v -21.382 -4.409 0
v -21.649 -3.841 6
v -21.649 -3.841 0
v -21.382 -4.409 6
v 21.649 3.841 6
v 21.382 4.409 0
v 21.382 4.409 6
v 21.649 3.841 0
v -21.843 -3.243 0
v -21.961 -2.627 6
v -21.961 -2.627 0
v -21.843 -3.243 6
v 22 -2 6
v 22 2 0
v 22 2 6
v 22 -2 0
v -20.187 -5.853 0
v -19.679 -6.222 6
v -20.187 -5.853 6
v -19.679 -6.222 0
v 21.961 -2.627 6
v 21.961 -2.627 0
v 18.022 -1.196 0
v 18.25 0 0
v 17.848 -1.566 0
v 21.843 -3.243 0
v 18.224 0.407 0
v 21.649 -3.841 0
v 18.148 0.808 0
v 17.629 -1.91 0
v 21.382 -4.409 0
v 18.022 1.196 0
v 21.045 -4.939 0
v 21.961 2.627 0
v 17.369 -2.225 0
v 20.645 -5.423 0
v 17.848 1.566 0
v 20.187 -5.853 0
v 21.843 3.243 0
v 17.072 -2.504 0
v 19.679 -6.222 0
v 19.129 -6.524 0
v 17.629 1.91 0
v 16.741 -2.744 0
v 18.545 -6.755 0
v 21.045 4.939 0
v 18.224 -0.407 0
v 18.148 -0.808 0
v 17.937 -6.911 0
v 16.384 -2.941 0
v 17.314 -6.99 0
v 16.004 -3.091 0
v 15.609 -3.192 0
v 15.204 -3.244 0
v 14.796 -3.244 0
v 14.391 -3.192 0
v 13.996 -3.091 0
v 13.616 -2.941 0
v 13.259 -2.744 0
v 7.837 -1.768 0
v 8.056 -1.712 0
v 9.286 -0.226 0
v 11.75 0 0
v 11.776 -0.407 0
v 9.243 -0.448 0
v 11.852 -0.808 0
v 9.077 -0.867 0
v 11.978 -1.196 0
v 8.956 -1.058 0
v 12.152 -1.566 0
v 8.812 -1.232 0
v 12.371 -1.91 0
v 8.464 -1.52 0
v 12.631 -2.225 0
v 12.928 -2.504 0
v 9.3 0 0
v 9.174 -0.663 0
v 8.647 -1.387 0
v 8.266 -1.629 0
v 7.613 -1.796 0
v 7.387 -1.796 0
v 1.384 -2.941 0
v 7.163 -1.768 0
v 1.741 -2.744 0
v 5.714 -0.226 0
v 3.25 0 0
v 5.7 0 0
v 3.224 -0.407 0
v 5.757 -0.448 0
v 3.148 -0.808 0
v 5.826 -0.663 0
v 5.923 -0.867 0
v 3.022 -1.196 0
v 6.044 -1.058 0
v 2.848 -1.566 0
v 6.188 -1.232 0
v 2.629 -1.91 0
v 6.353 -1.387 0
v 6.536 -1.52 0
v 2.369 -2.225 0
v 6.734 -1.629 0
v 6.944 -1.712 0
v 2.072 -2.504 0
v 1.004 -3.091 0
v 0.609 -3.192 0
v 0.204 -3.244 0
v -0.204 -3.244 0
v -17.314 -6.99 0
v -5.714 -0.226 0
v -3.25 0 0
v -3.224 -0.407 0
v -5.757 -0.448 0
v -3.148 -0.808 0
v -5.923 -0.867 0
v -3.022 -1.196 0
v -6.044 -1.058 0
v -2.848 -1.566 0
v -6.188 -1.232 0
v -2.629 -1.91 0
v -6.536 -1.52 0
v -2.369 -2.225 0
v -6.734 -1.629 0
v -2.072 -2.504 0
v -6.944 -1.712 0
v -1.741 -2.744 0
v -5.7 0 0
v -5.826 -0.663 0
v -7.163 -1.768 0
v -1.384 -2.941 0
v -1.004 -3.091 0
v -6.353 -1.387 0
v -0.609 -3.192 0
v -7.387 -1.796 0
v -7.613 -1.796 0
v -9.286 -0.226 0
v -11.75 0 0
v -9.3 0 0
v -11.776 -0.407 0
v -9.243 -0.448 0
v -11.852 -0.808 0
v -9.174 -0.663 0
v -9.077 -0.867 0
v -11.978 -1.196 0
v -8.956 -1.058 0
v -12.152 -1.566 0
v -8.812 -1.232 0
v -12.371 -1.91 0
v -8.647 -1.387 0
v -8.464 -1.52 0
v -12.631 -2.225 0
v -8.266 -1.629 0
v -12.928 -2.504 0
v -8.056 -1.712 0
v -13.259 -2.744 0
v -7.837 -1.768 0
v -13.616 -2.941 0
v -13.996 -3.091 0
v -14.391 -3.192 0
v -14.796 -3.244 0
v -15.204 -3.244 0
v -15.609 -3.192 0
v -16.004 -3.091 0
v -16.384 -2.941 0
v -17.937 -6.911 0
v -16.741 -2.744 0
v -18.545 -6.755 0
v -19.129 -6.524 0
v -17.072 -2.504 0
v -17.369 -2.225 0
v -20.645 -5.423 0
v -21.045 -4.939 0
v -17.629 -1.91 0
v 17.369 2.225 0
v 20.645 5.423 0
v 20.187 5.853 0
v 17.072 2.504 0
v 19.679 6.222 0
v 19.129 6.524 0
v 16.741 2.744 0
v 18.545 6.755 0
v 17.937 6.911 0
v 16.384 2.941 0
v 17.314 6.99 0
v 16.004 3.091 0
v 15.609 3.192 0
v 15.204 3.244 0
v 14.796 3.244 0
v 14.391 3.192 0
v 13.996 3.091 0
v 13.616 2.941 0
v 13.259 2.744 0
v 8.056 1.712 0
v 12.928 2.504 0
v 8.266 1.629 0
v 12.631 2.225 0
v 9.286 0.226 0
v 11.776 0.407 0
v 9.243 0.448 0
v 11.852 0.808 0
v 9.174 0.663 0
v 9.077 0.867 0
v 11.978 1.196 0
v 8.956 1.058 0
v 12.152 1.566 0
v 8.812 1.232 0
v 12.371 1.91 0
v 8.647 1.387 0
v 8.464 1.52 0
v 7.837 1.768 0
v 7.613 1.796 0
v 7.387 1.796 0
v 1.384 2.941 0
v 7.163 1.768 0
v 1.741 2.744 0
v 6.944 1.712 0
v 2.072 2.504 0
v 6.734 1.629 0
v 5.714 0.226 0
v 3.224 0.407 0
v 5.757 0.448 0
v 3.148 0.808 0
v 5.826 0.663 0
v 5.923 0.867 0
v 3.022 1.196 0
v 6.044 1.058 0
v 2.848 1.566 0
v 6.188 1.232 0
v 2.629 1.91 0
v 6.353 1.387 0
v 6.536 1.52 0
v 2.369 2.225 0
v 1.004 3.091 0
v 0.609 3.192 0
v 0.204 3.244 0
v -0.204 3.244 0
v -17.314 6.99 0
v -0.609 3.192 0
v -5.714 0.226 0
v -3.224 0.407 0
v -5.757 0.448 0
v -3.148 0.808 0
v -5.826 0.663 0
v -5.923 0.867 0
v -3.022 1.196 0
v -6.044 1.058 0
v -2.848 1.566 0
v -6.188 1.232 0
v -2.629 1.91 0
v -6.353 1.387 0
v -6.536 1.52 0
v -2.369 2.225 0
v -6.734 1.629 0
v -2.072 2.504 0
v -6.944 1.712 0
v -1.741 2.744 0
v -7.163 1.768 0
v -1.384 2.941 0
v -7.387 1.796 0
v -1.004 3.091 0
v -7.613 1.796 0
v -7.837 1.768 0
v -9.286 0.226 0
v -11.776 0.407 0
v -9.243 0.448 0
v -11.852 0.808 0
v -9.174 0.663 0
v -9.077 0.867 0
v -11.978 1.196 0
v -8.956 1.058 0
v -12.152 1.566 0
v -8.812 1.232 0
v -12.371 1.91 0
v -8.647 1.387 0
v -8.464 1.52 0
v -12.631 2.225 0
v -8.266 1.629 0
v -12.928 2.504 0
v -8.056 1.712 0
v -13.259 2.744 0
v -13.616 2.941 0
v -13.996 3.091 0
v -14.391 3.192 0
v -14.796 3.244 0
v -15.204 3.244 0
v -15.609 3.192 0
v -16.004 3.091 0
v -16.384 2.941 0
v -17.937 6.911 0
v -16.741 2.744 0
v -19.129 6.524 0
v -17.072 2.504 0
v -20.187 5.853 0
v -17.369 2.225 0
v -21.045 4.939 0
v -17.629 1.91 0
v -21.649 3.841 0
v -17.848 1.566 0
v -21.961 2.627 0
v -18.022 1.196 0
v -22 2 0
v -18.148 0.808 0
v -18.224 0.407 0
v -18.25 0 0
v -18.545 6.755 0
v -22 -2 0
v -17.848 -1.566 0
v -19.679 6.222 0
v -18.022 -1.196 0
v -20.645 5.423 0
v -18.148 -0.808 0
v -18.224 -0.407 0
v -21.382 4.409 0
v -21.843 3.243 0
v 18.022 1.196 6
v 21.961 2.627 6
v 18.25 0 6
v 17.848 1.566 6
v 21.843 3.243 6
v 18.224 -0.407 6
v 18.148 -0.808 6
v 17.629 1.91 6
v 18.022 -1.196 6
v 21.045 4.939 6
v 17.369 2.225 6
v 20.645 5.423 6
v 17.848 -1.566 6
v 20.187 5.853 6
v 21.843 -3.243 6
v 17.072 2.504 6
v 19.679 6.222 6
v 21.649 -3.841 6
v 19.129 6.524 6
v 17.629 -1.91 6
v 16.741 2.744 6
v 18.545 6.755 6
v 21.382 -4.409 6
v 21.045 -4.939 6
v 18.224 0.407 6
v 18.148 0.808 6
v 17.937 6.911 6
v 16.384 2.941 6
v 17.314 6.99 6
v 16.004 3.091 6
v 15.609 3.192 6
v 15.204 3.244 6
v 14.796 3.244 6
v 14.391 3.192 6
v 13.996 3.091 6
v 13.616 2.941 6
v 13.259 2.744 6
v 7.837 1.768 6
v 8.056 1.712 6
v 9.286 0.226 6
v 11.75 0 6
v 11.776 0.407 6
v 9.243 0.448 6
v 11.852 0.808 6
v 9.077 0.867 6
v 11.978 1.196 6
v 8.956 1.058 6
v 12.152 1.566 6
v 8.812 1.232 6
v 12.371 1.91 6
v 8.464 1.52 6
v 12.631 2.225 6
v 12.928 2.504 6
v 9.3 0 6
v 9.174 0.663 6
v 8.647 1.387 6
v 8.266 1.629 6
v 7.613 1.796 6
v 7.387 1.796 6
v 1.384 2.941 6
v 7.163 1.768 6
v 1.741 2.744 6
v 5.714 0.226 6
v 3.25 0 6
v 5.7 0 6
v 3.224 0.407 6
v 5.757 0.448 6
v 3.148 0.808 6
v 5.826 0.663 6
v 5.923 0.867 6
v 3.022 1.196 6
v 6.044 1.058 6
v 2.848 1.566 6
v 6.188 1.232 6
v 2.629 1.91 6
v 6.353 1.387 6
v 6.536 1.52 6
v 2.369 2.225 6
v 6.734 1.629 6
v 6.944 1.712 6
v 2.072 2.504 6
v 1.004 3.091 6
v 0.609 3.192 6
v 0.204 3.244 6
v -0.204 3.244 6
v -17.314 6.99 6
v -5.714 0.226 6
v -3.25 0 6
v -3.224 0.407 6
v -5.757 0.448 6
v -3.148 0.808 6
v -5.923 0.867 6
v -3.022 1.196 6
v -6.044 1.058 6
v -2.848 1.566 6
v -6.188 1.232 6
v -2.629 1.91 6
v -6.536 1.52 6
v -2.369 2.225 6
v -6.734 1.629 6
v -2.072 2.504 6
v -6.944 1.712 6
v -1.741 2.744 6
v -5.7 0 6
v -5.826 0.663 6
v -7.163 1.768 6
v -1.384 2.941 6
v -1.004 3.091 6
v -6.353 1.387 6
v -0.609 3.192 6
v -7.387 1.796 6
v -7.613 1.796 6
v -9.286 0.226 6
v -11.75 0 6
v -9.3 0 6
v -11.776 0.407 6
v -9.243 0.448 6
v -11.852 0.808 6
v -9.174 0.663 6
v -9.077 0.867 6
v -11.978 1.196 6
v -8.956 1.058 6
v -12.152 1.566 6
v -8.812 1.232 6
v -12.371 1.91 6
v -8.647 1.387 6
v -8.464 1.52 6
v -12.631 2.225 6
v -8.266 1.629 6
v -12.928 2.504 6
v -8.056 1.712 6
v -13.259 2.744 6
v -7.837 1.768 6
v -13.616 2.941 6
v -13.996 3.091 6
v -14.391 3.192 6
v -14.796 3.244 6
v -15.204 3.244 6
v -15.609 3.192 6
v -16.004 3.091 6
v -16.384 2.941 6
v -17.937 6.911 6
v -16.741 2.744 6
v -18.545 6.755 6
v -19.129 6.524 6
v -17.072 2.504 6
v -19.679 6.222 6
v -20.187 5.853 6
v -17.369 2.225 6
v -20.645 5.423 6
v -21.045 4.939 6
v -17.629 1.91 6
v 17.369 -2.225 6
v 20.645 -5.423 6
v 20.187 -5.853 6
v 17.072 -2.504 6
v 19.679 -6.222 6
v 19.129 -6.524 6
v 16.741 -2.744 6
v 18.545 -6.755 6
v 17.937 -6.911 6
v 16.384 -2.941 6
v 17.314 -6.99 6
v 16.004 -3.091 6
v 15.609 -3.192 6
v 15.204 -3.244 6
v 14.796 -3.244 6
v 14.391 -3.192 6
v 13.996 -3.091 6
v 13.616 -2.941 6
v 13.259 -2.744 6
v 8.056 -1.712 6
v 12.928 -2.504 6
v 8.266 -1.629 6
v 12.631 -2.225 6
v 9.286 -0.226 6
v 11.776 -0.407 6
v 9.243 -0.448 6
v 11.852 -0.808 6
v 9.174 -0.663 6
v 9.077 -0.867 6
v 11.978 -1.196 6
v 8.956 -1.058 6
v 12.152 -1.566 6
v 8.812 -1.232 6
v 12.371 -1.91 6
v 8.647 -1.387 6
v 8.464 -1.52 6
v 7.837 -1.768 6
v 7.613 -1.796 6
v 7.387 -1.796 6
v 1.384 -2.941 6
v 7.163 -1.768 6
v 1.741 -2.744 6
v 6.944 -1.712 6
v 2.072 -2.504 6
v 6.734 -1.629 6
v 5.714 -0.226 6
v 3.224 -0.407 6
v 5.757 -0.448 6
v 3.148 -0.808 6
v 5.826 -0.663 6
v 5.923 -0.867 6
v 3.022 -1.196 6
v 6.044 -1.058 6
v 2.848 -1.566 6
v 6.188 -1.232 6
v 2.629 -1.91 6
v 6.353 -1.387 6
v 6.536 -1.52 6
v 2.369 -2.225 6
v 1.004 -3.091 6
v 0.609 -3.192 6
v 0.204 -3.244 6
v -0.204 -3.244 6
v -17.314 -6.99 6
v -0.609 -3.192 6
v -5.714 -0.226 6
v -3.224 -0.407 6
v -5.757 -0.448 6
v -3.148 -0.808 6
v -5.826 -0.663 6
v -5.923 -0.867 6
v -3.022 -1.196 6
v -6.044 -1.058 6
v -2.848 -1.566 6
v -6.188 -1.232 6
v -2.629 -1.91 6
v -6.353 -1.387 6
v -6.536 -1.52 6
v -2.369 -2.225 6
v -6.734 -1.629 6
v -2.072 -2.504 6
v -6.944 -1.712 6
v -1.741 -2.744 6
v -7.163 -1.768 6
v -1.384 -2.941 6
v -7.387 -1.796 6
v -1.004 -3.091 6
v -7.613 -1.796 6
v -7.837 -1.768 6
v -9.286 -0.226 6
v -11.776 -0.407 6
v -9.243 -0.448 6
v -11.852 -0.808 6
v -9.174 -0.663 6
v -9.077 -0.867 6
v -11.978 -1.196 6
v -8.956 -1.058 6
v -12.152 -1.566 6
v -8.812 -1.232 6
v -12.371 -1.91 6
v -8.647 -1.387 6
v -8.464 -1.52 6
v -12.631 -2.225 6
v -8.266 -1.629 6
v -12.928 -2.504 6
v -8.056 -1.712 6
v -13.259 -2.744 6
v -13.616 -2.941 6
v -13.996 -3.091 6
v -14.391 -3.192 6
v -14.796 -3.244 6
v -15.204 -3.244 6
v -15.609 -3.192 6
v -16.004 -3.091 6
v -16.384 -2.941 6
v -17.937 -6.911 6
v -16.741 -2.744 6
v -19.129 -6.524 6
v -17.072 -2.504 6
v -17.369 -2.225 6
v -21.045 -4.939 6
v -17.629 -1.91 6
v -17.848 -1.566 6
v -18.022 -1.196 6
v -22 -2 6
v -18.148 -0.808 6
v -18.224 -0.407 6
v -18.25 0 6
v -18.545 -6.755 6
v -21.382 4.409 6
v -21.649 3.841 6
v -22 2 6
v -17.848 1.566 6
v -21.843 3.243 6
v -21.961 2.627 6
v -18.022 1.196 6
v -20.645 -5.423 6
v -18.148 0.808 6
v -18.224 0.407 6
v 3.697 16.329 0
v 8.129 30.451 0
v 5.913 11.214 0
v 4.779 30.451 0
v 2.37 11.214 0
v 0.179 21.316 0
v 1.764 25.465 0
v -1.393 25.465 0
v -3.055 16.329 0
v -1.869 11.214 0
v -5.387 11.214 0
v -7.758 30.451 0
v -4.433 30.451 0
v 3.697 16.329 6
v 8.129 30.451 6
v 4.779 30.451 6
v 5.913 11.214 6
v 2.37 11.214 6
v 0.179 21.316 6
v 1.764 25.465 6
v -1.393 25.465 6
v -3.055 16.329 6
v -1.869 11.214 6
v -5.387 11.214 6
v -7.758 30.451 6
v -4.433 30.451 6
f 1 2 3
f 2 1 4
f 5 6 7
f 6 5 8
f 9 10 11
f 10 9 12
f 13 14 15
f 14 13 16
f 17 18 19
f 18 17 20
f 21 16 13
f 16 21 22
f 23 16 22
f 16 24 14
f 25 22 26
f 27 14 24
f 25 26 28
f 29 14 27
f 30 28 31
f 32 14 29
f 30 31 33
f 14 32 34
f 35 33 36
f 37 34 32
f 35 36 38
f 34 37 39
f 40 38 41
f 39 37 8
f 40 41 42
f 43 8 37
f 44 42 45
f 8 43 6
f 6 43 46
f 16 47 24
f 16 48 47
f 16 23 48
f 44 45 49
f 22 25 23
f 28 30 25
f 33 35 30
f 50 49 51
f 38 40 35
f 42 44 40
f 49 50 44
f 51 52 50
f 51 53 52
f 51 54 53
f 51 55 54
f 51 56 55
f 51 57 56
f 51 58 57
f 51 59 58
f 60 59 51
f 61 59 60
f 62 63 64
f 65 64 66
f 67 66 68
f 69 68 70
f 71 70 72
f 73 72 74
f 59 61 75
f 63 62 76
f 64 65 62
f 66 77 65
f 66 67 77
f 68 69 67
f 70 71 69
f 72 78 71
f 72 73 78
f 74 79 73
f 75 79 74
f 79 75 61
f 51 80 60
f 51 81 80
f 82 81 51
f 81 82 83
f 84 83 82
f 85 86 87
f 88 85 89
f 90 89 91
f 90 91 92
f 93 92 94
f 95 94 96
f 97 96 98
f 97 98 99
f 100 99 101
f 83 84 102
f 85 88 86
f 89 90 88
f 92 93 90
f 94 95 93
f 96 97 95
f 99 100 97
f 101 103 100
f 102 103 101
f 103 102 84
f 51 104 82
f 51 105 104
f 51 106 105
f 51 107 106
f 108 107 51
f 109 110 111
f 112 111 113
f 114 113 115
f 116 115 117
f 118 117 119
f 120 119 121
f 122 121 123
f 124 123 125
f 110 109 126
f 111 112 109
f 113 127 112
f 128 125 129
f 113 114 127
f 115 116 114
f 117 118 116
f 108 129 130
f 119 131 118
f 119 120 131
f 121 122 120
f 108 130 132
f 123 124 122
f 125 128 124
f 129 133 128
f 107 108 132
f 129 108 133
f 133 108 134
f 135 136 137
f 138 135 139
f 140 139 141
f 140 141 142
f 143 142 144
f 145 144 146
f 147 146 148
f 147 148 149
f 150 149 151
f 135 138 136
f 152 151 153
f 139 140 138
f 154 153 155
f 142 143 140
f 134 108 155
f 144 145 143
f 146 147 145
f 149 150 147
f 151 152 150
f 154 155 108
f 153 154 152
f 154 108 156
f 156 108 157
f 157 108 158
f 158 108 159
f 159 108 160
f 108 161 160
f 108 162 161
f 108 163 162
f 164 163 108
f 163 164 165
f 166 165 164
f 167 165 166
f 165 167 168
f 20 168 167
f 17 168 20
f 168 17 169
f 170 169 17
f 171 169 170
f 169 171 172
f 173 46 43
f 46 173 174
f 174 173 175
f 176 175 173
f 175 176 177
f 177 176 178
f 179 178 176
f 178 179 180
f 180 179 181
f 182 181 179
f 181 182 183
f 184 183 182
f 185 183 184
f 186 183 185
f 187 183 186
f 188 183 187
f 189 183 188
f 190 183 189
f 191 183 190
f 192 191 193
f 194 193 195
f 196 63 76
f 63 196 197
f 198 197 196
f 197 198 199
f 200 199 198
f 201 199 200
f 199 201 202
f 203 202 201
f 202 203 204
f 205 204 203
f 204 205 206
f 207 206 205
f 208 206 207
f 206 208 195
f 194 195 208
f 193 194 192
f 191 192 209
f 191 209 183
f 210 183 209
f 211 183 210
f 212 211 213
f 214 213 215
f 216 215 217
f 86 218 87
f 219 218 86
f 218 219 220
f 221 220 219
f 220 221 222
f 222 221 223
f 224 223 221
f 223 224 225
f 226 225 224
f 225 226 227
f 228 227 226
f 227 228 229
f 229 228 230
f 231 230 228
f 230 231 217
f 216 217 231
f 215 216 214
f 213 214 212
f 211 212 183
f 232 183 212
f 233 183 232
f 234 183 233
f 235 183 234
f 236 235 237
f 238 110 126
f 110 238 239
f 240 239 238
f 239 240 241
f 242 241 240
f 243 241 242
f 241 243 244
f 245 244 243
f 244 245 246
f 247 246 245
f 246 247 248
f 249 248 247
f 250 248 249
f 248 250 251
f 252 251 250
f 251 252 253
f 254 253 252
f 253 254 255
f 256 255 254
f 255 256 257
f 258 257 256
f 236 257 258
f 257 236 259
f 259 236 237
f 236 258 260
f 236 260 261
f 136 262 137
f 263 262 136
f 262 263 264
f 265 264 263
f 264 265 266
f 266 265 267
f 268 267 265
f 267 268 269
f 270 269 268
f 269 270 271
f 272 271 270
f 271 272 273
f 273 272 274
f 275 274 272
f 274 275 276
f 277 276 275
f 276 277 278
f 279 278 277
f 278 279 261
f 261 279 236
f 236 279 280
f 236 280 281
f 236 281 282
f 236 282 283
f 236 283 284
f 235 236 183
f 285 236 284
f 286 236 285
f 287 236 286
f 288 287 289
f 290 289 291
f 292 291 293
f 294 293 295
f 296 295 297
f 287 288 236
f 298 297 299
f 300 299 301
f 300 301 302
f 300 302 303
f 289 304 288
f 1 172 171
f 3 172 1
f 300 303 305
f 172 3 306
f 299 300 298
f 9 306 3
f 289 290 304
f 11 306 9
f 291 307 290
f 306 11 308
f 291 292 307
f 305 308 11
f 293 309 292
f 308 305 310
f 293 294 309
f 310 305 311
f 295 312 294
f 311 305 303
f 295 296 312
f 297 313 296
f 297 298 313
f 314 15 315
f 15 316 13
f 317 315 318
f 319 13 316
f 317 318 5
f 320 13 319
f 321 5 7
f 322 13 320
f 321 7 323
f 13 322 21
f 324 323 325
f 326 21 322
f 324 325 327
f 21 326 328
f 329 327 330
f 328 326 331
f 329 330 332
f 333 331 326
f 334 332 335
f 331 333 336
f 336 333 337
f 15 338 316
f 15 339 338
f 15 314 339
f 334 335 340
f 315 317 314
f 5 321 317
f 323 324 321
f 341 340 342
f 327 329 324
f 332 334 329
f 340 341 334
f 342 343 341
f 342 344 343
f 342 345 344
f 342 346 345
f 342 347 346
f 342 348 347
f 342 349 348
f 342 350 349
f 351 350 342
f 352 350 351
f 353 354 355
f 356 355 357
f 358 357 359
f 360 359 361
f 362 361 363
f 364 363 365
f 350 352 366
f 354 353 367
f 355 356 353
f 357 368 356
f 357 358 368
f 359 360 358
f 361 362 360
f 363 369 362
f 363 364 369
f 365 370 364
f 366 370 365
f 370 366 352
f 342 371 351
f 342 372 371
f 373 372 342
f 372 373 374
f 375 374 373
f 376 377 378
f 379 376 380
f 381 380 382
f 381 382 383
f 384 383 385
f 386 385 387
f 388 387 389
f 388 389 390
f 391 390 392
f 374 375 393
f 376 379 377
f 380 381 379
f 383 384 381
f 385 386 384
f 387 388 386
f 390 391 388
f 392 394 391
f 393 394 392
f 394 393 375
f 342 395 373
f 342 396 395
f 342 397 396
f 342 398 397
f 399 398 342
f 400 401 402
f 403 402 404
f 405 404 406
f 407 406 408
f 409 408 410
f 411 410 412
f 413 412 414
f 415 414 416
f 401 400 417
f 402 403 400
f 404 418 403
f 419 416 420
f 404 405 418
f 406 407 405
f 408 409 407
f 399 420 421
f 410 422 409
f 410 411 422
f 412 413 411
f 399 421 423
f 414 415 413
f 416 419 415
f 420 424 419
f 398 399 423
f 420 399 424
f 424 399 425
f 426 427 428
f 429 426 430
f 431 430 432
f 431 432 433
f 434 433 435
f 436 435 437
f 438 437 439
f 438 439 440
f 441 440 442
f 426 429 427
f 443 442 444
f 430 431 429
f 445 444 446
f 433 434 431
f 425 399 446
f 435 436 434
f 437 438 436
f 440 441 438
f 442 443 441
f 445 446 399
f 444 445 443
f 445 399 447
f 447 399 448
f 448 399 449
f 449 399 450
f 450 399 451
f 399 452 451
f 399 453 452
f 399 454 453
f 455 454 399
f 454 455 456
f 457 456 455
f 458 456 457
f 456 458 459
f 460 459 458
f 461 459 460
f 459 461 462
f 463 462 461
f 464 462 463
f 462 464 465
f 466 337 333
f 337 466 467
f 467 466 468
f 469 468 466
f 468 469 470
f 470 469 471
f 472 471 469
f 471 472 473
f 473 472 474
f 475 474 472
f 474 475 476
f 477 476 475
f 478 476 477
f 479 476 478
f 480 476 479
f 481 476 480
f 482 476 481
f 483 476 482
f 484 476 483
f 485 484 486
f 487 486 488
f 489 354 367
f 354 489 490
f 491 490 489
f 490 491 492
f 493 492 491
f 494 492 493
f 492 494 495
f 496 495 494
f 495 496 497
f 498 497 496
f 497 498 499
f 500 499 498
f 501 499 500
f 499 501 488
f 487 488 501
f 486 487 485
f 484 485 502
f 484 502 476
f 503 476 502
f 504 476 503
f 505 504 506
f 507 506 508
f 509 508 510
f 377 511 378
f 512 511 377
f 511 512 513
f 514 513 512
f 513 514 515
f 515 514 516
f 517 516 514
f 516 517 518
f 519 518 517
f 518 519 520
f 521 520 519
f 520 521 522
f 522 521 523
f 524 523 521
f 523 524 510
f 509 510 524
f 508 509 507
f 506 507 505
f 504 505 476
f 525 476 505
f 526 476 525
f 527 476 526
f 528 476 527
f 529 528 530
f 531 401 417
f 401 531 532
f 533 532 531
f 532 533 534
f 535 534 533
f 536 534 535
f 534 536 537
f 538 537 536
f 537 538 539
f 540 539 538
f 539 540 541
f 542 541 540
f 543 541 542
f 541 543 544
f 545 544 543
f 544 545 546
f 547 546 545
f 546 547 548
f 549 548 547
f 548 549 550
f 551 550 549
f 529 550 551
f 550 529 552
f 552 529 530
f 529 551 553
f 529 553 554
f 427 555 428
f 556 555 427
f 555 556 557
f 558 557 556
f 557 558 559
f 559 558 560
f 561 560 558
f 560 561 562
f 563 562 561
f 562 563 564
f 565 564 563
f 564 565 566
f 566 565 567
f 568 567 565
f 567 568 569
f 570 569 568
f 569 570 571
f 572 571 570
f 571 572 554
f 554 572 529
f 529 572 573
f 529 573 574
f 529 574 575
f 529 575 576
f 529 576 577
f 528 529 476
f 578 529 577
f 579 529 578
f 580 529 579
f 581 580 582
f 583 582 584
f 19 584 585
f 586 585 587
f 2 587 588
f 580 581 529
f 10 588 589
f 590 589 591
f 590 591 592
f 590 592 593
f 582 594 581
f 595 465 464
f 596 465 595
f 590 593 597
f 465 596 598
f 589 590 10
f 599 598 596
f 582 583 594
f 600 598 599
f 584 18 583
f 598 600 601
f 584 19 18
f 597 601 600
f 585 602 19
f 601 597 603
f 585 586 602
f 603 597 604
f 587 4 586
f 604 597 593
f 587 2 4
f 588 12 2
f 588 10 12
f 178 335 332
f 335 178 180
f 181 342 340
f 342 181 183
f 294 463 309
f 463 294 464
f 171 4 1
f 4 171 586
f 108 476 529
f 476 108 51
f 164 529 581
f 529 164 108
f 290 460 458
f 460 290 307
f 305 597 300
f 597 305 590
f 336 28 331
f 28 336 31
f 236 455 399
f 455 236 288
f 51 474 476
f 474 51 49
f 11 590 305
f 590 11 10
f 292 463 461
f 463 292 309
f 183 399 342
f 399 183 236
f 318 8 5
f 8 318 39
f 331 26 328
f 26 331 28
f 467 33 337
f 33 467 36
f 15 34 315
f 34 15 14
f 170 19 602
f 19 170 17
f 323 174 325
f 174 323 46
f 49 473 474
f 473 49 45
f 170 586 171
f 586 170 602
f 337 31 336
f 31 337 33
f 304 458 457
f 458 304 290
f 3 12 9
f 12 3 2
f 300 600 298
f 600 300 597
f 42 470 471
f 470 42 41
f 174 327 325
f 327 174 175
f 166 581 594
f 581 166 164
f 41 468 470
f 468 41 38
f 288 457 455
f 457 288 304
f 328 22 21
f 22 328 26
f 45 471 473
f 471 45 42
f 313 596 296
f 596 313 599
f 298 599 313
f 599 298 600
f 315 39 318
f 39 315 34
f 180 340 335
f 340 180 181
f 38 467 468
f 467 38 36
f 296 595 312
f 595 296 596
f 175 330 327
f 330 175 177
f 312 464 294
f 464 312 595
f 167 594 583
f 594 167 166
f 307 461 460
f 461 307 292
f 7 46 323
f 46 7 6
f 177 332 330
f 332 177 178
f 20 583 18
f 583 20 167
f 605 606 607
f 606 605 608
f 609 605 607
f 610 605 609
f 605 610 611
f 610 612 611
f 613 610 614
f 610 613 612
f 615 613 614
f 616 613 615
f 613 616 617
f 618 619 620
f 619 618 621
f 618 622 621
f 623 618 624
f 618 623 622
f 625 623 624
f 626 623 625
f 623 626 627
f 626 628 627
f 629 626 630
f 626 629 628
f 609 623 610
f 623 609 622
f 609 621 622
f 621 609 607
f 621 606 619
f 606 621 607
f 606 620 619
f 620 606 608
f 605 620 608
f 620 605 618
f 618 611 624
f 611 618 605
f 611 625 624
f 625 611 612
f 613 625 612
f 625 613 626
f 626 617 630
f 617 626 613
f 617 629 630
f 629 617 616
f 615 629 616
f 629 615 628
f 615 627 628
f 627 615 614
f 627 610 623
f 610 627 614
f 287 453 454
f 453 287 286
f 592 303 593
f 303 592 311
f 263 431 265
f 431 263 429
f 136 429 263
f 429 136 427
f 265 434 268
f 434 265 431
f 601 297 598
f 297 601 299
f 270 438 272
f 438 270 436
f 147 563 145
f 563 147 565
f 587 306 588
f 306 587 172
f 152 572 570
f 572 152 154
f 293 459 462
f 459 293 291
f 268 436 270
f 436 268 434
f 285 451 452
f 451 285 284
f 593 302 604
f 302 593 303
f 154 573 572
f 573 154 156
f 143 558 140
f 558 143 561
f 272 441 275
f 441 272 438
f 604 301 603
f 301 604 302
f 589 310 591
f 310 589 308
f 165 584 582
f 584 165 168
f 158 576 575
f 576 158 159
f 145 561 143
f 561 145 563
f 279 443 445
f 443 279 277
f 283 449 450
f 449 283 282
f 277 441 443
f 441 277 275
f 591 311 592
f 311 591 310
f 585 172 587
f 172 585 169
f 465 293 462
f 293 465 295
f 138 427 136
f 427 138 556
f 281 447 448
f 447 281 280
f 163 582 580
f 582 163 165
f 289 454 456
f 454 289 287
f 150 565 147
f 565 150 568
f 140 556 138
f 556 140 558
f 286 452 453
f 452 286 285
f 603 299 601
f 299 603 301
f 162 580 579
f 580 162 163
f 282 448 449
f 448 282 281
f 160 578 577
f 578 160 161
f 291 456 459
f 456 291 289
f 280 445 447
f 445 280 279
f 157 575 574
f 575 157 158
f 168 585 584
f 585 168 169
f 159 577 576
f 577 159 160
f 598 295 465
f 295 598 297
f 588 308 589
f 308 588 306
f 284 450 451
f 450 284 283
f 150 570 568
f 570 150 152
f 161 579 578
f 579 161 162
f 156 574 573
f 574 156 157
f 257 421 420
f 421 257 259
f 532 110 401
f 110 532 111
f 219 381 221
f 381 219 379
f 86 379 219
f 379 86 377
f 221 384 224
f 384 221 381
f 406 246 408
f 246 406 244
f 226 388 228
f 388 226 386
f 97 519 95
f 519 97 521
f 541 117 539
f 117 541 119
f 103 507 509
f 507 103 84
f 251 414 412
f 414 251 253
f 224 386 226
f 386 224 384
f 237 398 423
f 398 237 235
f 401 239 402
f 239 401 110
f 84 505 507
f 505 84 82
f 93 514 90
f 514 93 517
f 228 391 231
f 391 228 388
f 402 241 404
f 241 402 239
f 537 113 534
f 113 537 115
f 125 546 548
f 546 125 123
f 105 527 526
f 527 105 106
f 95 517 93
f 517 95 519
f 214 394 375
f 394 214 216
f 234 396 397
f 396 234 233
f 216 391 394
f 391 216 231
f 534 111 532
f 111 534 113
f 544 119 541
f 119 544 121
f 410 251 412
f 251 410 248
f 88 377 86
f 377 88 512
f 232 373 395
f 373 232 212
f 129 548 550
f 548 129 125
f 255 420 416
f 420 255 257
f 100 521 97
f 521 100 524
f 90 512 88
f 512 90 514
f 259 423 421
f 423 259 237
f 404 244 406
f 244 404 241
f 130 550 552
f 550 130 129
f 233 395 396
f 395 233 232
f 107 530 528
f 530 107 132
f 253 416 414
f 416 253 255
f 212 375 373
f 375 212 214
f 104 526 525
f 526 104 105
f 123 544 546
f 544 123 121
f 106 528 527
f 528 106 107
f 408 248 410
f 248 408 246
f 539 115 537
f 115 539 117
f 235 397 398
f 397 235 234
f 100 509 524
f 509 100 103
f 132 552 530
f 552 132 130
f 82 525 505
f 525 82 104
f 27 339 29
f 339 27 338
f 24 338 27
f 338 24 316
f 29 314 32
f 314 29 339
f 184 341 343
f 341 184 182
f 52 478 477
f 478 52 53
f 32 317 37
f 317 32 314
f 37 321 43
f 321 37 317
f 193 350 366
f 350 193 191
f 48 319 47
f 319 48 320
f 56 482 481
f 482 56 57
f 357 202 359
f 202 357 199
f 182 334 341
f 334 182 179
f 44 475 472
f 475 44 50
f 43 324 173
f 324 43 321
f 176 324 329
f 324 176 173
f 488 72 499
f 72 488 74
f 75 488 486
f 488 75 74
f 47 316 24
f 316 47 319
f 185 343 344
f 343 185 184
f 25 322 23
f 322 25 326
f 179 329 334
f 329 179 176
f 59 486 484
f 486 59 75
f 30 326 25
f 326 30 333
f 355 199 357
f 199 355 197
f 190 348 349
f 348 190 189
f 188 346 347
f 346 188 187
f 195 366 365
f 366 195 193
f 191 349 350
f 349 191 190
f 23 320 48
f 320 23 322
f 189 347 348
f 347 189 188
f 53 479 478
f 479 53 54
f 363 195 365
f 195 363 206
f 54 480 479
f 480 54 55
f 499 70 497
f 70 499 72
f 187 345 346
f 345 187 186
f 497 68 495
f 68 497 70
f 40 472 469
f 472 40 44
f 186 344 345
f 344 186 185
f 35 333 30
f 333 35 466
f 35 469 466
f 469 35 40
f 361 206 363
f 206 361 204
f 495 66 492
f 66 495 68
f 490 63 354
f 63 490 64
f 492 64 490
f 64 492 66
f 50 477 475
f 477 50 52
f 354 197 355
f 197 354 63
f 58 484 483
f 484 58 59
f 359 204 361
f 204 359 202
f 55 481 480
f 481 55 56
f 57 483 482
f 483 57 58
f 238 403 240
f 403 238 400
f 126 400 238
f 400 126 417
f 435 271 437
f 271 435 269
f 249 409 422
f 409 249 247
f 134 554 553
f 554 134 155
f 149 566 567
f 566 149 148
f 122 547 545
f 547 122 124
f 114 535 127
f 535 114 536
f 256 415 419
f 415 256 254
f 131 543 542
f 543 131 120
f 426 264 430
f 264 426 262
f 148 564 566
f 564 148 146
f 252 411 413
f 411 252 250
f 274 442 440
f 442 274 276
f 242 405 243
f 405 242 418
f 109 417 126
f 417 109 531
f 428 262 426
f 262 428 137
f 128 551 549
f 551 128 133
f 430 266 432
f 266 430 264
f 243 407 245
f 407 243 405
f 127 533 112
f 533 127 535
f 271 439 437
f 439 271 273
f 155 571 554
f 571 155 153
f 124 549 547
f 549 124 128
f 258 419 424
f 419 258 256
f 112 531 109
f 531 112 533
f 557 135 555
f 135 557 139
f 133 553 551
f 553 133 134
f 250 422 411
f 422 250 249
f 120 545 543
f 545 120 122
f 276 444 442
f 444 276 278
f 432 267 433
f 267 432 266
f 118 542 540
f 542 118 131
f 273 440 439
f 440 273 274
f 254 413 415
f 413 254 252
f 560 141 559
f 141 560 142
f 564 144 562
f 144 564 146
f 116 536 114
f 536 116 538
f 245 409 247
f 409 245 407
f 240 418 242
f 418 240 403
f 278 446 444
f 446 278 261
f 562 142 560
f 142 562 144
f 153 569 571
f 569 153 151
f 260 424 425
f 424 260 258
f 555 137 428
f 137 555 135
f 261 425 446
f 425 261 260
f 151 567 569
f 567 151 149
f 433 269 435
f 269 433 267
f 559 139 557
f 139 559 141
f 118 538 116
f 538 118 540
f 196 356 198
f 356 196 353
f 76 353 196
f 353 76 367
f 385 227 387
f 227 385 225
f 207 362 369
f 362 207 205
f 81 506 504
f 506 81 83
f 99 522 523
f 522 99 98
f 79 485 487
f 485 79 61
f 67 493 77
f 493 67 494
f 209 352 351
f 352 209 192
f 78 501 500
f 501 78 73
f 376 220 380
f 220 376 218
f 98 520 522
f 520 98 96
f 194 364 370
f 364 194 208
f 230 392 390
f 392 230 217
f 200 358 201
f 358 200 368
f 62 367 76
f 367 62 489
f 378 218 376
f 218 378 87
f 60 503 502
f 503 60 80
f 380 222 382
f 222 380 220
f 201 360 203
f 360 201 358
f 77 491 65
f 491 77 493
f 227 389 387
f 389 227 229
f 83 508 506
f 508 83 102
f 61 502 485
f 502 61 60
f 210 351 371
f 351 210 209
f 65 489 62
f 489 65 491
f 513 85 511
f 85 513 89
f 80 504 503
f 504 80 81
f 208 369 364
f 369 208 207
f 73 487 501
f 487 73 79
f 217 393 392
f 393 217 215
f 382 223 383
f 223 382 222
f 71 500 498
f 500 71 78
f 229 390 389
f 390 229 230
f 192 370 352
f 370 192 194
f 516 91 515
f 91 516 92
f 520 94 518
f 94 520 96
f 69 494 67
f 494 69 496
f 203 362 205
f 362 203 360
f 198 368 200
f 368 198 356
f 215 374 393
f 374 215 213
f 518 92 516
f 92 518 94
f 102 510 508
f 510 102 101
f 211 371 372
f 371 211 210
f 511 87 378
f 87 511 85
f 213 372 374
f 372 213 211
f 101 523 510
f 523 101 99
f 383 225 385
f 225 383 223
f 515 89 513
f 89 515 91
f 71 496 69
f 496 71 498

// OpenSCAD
$fn = 50;


difference() {
	union() {
		hull() {
			translate(v = [-17.0000000000, 2.0000000000, 0]) {
				cylinder(h = 6, r = 5);
			}
			translate(v = [17.0000000000, 2.0000000000, 0]) {
				cylinder(h = 6, r = 5);
			}
			translate(v = [-17.0000000000, -2.0000000000, 0]) {
				cylinder(h = 6, r = 5);
			}
			translate(v = [17.0000000000, -2.0000000000, 0]) {
				cylinder(h = 6, r = 5);
			}
		}
		translate(v = [0, 30.0000000000, 0]) {
			linear_extrude(height = 6) {
				text(font = "DejaVu Sans Mono:style=Bold", halign = "center", size = 19.0000000000, text = "W", valign = "top");
			}
		}
	}
	union() {
		translate(v = [-15.0000000000, 0.0000000000, 0]) {
			translate(v = [0, 0, -100]) {
				cylinder(h = 200, r = 3.2500000000);
			}
		}
		translate(v = [0, 0, -100]) {
			cylinder(h = 200, r = 3.2500000000);
		}
		translate(v = [15.0000000000, 0.0000000000, 0]) {
			translate(v = [0, 0, -100]) {
				cylinder(h = 200, r = 3.2500000000);
			}
		}
		translate(v = [-15.0000000000, 0.0000000000, 0]) {
			translate(v = [0, 0, -100]) {
				cylinder(h = 200, r = 1.8000000000);
			}
		}
		translate(v = [-7.5000000000, 0.0000000000, 0]) {
			translate(v = [0, 0, -100]) {
				cylinder(h = 200, r = 1.8000000000);
			}
		}
		translate(v = [0, 0, -100]) {
			cylinder(h = 200, r = 1.8000000000);
		}
		translate(v = [7.5000000000, 0.0000000000, 0]) {
			translate(v = [0, 0, -100]) {
				cylinder(h = 200, r = 1.8000000000);
			}
		}
		translate(v = [15.0000000000, 0.0000000000, 0]) {
			translate(v = [0, 0, -100]) {
				cylinder(h = 200, r = 1.8000000000);
			}
		}
	}
}
